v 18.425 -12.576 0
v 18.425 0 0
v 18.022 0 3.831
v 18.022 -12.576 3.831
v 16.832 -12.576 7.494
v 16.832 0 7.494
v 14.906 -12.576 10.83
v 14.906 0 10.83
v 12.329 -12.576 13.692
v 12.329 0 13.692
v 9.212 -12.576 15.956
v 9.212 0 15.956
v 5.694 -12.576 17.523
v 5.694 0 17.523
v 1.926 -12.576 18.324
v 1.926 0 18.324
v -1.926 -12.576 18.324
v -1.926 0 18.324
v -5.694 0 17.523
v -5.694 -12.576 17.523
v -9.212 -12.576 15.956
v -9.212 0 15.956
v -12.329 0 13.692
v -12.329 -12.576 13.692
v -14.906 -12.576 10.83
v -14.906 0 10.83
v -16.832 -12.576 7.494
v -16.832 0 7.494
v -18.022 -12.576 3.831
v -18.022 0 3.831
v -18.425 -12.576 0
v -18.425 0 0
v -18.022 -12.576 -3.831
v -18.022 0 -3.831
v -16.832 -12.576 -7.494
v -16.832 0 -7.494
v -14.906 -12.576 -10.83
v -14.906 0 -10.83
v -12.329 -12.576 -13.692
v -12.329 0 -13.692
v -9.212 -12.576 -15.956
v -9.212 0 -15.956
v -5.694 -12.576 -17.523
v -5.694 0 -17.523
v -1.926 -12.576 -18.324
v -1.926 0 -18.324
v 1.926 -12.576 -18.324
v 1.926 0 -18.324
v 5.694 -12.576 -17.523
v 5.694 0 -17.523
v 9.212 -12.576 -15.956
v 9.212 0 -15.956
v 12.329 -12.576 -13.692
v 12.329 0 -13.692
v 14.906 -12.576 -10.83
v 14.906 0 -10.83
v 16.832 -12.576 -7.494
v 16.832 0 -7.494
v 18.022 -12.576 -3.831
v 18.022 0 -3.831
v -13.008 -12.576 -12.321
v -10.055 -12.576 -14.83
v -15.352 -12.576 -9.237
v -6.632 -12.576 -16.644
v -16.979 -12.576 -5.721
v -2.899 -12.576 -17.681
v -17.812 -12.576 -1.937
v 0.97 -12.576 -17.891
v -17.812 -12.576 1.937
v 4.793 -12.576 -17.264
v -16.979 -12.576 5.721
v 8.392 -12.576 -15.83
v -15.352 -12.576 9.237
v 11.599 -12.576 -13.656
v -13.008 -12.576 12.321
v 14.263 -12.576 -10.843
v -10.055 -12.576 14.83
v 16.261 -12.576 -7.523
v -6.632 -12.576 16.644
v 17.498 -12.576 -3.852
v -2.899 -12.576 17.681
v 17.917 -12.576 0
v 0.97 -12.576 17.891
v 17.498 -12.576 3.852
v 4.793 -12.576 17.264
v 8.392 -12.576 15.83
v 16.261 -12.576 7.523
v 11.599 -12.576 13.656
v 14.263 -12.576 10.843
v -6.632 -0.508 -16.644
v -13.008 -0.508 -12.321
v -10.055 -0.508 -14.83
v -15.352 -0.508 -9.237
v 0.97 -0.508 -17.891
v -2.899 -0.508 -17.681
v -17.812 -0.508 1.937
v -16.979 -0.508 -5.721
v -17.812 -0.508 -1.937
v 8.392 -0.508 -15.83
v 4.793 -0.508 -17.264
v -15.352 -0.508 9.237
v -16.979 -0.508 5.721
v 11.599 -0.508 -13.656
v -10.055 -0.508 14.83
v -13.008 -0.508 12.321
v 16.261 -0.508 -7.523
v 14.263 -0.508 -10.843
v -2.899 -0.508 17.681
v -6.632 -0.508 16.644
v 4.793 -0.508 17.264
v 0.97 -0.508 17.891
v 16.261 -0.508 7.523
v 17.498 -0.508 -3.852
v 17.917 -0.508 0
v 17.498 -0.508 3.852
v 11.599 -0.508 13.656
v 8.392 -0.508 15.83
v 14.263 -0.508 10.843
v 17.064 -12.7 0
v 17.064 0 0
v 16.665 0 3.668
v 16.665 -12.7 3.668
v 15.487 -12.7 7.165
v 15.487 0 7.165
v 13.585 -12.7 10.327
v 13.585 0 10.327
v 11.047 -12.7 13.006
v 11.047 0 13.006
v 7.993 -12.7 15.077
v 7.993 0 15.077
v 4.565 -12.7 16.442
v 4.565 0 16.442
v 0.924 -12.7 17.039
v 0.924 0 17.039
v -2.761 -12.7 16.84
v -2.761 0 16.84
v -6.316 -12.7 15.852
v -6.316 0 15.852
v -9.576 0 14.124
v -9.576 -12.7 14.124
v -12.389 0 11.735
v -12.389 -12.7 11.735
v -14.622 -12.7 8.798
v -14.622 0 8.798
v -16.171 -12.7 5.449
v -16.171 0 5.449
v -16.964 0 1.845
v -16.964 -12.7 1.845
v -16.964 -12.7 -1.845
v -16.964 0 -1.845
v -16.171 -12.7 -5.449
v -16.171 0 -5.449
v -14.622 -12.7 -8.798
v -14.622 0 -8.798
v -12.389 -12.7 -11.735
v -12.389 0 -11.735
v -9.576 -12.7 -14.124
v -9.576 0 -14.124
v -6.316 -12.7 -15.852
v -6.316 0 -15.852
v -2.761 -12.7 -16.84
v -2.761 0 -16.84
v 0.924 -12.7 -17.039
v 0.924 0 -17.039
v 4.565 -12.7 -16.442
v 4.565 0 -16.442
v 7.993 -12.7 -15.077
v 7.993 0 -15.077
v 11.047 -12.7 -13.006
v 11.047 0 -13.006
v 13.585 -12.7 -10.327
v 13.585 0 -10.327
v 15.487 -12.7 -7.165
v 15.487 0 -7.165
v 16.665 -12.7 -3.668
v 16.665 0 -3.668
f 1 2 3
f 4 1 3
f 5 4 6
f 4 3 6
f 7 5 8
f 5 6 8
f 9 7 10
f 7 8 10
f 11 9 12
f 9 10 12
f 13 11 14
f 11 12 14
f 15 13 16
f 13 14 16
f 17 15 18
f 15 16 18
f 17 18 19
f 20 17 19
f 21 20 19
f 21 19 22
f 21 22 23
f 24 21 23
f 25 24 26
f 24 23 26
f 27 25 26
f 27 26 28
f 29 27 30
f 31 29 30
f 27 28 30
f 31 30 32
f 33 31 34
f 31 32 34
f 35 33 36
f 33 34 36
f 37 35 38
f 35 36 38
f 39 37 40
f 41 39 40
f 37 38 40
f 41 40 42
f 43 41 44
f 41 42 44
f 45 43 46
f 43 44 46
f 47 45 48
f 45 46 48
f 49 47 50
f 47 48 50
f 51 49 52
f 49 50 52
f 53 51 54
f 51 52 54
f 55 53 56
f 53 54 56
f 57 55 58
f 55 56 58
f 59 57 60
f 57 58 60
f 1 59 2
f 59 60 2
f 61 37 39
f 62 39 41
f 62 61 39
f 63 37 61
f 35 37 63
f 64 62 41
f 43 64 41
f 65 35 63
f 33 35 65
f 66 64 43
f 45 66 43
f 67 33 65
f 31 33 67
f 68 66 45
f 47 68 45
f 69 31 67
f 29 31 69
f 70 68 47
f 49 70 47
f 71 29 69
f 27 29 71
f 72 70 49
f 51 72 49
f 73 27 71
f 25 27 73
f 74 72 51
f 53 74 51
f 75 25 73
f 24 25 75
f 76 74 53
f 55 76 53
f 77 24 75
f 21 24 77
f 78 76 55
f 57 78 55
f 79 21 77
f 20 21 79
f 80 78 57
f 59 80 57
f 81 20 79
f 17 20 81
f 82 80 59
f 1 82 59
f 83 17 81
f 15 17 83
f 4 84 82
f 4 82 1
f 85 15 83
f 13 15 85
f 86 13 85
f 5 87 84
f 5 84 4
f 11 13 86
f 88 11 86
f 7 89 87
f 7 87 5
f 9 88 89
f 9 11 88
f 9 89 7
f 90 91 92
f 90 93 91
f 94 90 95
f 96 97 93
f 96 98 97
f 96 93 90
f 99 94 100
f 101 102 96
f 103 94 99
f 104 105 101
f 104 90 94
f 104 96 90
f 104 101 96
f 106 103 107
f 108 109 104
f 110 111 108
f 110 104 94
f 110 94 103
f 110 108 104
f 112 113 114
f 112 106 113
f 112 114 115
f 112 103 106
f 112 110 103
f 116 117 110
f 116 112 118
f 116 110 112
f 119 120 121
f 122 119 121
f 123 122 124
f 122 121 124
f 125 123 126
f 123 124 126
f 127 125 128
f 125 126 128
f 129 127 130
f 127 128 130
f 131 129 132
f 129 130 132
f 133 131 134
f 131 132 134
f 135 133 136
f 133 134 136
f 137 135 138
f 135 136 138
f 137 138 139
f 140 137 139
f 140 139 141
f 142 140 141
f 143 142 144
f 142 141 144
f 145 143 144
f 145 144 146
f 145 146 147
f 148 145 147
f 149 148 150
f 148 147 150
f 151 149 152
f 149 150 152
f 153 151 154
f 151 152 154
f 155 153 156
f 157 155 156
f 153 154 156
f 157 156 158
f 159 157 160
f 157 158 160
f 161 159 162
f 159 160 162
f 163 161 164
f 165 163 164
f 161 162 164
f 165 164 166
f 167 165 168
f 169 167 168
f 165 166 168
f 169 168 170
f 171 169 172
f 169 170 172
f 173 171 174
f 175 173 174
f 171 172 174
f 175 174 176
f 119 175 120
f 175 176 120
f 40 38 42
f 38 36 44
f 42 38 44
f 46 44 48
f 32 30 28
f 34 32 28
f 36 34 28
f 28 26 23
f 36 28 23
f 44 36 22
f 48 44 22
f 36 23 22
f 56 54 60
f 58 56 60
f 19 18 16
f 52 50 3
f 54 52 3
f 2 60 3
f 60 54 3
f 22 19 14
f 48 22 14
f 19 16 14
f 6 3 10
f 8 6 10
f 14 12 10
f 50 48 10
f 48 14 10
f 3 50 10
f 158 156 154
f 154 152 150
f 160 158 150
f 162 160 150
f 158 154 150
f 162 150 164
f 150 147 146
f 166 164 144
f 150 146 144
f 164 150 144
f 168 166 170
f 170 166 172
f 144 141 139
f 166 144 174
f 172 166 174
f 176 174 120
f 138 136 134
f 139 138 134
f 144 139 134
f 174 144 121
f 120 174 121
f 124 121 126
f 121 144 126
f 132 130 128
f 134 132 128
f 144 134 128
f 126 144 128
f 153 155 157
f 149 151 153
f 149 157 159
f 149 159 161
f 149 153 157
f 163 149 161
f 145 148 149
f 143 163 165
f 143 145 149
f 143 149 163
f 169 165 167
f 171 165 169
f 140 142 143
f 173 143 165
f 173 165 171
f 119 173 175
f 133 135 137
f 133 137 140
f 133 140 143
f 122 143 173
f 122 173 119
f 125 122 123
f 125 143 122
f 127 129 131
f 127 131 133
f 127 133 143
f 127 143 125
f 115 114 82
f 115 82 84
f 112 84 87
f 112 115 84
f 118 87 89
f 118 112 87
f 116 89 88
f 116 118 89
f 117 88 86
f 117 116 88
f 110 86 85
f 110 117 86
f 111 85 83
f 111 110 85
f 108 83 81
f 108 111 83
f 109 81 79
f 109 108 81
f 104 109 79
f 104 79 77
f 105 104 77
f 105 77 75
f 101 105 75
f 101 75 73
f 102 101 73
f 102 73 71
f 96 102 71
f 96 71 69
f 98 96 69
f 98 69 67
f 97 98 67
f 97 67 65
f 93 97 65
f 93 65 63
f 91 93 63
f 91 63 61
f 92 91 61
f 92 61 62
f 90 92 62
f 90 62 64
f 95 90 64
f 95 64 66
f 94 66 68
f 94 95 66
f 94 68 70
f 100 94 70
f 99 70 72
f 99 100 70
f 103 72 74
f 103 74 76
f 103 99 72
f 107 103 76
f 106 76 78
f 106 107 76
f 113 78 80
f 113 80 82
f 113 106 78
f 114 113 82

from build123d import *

# Parameters (mm, degrees)
F0_R     = 17.0643351891
F1_DEPTH = 12.7
F5_R     = 18.4248242349
F6_DEPTH = 12.5755444169
F7_T     = -0.508


# Not quite as in the source:
# - the program builds the solid bodies; features that only make, move or delete a surface that nothing else refers to are left out


with BuildPart() as f1:
    # F0 (on Front) → F1 (new body)
    with BuildSketch(Plane.XZ):
        Circle(F0_R)
    extrude(amount=F1_DEPTH)


with BuildPart() as f6:
    # F5 (on Front) → F6 (new body)
    with BuildSketch(Plane.XZ):
        Circle(F5_R)
    extrude(amount=F6_DEPTH)

    # F7
    f7_openings = [f6.faces().sort_by_distance(p)[0] for p in [
        (0, -12.575544, 0),
    ]]
    offset(amount=F7_T, openings=f7_openings)


solid = Compound([f1.part, f6.part])
